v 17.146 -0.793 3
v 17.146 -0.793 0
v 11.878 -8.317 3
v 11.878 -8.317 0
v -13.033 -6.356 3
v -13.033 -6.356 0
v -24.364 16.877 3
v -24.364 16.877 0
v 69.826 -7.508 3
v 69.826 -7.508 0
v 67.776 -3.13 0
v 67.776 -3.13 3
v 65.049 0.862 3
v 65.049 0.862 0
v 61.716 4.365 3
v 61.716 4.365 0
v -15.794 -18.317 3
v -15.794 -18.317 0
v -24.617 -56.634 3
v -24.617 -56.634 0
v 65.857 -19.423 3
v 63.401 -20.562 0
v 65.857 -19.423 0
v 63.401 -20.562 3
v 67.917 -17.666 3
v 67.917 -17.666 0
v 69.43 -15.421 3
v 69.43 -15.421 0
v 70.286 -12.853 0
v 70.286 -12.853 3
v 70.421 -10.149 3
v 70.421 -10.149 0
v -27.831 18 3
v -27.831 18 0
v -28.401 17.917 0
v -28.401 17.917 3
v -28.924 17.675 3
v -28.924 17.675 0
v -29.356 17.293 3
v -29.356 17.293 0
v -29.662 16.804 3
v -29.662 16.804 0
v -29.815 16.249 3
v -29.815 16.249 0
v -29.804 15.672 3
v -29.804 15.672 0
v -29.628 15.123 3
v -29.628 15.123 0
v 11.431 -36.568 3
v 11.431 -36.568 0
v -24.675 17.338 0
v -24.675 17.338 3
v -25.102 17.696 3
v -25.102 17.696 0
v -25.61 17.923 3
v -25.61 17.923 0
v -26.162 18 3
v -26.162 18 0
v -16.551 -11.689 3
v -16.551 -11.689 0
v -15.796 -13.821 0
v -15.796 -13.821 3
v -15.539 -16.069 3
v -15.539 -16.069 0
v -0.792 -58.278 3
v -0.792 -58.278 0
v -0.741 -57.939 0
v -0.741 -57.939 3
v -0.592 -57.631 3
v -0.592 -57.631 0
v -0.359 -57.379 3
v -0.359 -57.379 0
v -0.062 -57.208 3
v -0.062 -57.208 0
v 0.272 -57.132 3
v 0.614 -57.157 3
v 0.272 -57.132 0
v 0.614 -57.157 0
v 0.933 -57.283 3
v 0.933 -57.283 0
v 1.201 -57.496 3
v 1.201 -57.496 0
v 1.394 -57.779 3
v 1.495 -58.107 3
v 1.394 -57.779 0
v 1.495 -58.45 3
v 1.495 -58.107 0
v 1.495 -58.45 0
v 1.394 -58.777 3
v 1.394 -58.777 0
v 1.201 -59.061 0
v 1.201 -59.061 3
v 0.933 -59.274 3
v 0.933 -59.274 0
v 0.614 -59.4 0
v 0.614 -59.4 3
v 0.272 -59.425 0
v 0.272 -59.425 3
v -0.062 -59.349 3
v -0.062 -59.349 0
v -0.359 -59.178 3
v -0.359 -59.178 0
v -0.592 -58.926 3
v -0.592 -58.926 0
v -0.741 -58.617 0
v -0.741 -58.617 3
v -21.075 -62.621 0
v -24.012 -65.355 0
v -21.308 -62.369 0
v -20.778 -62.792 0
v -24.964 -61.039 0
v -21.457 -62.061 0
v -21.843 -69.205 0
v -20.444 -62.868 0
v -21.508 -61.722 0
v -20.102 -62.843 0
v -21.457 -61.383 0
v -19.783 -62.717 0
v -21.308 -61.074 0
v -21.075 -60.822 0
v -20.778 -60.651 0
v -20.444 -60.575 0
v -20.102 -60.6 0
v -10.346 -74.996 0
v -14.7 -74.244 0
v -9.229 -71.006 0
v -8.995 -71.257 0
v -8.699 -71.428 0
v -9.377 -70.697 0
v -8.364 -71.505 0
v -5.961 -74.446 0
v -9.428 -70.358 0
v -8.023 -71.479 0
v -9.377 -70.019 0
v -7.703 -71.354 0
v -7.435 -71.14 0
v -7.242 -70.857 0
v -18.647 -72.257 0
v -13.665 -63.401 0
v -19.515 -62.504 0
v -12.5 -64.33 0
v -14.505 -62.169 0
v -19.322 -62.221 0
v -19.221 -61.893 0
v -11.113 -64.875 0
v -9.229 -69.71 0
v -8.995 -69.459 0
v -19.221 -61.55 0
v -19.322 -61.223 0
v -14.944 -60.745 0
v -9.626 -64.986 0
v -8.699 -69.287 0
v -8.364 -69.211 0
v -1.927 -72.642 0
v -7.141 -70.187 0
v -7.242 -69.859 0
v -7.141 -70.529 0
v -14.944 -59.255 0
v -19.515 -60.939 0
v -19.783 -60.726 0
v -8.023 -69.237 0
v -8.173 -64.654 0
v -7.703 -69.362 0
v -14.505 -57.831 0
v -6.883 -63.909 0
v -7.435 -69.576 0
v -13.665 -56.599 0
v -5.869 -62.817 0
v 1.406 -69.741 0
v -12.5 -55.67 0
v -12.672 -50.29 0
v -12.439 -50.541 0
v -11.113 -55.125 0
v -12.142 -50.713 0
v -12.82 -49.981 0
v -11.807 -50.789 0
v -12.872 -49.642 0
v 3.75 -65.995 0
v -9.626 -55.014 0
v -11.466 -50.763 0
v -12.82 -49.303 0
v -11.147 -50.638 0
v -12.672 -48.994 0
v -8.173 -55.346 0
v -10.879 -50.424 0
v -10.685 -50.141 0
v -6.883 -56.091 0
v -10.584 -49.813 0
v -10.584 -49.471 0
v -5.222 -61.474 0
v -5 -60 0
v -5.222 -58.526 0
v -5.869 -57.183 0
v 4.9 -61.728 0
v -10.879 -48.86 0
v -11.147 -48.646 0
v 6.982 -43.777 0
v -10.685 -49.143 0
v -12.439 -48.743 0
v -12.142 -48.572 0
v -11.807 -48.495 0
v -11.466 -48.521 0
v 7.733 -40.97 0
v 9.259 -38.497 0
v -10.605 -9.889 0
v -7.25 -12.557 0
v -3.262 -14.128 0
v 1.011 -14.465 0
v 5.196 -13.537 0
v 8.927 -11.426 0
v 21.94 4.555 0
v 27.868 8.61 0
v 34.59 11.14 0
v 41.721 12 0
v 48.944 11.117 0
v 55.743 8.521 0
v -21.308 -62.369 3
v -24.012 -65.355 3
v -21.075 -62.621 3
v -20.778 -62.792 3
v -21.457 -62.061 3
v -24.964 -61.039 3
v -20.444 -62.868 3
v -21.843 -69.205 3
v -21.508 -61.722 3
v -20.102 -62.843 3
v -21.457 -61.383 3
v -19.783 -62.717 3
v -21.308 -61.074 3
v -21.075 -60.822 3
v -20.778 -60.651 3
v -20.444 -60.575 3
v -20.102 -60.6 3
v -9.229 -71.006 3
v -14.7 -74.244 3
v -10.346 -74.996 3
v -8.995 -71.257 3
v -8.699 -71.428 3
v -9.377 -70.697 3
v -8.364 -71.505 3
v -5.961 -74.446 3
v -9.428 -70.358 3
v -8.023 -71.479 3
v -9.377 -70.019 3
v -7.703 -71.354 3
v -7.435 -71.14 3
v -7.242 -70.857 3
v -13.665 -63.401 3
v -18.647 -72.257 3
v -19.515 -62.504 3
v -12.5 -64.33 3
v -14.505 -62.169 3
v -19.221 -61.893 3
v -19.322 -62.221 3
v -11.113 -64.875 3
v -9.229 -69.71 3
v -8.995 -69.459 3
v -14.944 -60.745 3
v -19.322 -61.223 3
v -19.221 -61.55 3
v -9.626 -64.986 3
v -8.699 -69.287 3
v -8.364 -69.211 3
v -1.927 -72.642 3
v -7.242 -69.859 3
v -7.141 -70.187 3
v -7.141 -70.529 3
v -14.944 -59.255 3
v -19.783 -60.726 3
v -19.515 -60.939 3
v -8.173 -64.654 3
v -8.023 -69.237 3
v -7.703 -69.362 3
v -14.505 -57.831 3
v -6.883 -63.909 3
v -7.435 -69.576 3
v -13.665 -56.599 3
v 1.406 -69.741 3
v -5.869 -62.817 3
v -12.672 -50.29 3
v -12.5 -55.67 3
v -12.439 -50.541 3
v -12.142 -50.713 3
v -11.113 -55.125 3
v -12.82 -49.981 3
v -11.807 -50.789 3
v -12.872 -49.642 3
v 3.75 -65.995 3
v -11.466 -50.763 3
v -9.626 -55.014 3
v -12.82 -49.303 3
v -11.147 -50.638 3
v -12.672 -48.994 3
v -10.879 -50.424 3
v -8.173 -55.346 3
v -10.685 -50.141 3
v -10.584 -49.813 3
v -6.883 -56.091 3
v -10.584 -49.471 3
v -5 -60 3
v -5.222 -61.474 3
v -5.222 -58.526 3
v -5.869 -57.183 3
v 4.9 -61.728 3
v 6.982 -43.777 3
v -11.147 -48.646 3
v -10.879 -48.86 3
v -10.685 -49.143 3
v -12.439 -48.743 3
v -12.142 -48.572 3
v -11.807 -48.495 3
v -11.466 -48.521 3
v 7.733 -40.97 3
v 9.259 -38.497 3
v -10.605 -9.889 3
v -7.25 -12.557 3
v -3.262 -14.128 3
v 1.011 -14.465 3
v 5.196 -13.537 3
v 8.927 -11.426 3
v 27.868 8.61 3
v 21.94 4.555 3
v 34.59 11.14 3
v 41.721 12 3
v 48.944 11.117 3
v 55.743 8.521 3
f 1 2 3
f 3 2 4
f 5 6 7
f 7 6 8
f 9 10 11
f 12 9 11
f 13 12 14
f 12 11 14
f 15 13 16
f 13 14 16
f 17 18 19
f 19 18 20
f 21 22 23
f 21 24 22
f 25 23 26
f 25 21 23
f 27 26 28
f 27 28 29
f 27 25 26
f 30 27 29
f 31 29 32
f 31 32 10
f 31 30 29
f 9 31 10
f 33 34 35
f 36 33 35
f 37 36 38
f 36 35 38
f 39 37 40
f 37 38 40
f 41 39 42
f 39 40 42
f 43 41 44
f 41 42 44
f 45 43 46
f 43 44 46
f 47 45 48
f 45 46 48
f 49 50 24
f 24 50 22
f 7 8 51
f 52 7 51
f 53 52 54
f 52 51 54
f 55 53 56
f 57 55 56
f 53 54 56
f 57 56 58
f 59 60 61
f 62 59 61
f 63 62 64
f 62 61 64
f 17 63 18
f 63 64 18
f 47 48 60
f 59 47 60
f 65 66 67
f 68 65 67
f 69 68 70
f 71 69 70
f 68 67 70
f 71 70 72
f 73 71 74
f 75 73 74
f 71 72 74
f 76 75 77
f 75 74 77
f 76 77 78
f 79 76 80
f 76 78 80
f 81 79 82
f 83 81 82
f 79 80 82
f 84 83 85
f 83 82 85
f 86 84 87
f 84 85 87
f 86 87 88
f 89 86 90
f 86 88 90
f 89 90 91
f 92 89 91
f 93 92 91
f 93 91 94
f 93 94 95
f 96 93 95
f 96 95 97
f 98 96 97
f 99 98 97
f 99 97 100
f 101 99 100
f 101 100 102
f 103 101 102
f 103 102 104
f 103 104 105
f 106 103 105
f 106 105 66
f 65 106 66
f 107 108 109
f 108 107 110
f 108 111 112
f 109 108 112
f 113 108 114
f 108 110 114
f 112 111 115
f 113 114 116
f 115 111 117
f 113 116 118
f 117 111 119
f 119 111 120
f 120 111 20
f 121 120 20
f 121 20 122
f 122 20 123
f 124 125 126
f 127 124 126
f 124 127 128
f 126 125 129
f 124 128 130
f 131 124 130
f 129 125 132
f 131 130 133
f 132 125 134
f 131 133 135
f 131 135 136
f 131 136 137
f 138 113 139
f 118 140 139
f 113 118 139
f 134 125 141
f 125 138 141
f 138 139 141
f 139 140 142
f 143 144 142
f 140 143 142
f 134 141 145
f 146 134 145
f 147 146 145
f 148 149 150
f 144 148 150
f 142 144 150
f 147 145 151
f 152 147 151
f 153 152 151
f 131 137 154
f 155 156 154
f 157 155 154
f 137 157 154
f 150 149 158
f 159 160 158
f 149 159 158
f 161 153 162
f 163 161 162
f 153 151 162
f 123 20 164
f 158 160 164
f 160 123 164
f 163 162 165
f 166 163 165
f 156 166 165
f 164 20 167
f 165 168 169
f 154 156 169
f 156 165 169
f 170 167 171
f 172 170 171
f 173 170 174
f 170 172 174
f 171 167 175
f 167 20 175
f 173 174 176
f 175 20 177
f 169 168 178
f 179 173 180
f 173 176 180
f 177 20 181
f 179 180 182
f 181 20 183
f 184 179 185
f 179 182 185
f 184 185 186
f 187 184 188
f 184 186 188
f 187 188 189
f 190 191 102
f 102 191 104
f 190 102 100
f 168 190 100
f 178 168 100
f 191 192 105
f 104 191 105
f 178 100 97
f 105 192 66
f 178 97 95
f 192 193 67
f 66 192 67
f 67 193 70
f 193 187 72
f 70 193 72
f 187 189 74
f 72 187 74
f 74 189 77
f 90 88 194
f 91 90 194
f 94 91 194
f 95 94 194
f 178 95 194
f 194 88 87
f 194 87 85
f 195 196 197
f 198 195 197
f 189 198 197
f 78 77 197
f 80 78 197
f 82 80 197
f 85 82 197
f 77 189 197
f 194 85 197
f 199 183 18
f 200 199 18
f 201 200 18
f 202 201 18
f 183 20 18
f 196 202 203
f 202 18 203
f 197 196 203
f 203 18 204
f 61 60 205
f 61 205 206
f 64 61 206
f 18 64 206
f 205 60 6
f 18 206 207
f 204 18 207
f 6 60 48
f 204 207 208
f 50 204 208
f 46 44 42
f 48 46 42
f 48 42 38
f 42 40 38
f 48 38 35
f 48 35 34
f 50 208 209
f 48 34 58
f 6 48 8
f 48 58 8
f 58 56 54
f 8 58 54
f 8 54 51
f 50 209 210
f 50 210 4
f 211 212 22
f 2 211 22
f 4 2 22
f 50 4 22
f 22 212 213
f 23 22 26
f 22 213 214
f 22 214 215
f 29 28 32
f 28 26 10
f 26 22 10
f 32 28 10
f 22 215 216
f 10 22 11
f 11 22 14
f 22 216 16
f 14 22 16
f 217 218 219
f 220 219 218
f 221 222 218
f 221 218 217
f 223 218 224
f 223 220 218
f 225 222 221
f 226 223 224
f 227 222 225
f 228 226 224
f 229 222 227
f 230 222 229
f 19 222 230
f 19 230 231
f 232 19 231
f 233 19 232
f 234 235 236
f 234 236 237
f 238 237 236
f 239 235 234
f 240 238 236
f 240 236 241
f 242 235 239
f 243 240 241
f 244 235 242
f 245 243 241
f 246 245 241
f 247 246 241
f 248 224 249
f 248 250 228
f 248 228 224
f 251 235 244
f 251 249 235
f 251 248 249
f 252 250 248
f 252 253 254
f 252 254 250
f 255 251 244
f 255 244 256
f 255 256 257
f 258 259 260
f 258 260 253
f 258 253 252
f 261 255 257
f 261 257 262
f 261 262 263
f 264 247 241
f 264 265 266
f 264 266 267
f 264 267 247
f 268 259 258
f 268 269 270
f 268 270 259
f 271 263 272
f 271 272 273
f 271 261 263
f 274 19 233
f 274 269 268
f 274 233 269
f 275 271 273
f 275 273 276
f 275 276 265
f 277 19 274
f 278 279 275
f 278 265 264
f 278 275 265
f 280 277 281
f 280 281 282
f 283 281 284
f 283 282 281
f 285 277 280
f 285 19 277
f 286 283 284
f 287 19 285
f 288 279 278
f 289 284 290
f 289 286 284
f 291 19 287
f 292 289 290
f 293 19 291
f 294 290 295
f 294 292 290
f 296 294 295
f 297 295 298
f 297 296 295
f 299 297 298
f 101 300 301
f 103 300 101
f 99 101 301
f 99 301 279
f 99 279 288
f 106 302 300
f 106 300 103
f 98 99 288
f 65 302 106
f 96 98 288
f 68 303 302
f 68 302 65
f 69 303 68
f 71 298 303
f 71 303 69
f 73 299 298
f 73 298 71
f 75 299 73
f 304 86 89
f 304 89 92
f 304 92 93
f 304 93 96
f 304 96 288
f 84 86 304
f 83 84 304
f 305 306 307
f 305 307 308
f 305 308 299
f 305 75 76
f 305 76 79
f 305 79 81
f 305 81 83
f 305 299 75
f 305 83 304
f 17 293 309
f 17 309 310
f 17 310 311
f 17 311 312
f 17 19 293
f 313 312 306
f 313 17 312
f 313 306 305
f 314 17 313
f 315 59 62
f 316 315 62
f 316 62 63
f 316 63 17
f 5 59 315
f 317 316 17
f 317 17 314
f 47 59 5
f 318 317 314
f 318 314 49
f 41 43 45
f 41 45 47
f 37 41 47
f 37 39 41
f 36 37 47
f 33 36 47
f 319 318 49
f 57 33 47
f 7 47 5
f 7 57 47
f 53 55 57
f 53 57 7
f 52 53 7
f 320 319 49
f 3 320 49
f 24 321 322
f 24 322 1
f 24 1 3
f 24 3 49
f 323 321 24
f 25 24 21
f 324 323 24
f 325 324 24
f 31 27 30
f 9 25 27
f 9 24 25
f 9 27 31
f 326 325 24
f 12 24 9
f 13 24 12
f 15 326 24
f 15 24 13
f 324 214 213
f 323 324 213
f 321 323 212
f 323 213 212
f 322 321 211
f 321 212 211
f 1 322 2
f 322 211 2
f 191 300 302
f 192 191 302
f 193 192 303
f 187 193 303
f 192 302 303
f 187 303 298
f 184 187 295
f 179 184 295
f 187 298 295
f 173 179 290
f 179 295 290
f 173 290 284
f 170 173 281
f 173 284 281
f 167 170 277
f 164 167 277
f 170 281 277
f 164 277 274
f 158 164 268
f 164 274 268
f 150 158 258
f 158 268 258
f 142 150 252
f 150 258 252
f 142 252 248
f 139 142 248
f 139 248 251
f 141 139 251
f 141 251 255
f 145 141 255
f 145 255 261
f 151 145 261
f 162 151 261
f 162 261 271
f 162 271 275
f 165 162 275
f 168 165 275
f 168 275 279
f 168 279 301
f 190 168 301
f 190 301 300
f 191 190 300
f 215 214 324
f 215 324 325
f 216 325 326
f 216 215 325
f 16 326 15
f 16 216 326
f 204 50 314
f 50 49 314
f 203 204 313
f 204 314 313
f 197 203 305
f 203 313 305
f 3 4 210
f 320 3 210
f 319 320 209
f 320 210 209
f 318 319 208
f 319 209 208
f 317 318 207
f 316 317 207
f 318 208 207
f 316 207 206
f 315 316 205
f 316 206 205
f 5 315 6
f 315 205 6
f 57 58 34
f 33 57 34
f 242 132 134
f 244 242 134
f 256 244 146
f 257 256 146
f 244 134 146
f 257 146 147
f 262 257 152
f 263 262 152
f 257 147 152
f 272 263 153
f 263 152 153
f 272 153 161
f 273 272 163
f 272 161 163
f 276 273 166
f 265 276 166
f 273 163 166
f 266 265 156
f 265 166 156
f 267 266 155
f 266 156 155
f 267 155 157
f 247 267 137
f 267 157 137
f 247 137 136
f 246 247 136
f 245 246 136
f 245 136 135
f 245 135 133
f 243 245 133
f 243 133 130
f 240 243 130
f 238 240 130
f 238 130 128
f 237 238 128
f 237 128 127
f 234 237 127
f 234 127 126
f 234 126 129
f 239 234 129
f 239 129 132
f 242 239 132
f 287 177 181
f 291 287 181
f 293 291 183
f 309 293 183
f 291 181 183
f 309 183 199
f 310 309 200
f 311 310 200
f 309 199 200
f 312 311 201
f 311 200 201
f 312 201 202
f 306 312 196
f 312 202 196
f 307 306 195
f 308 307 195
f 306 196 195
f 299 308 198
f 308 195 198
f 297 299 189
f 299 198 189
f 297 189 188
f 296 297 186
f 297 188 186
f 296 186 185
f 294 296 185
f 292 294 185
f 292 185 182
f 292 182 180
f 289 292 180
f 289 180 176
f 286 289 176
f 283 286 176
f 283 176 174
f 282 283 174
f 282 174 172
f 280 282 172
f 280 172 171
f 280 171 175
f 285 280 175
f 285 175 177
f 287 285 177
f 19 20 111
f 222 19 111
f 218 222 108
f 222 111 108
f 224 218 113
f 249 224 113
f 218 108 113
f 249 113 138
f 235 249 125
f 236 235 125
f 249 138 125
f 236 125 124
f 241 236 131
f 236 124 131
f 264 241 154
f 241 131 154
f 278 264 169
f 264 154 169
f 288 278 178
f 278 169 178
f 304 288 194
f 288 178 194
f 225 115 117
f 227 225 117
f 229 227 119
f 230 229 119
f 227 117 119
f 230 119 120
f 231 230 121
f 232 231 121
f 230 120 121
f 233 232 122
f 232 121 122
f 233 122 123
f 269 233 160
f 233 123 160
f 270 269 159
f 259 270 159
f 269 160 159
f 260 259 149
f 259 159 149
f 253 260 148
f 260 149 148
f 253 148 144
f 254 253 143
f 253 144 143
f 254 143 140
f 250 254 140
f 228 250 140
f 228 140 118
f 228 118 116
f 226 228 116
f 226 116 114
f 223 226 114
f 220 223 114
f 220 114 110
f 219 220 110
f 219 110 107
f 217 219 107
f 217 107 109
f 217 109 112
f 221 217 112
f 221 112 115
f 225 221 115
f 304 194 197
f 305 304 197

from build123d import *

# Parameters (mm, degrees)
BOSS_EXTRUDE1_START            = -3
BOSS_EXTRUDE1_OUTLINE_R        = 2.5
BOSS_EXTRUDE1_DEPTH            = 3
FILLET1_R                      = 10
BOSS_EXTRUDE2_START            = -3
BOSS_EXTRUDE2_DEPTH            = 3
CUT_EXTRUDE1_START             = -3
CUT_EXTRUDE1_DEPTH             = 3
FILLET2_R                      = 10
F_2_3_2_3_DIAMETER_HOLE1_D     = 2.3
F_2_3_2_3_DIAMETER_HOLE1_DEPTH = 10
F_2_3_2_3_DIAMETER_HOLE1_TIP   = 0.690989712
SKETCH6_R                      = 5
CUT_EXTRUDE2_DEPTH             = 103.947966144


with BuildPart() as part:
    # Boss-Extrude1: read off the stored shape, not the designer's step
    # Boss-Extrude1 outline → Boss-Extrude1 (new body)
    with BuildSketch(Plane.XY.offset(3).offset(BOSS_EXTRUDE1_START)):
        with BuildLine():
            ThreePointArc((-24.364065342, 16.876742294), (-25.101814907, 17.696096192), (-26.161653435, 18))
            Line((-26.161653435, 18), (-27.830556346, 18))
            ThreePointArc((-27.830556346, 18), (-29.526652538, 17.059838528), (-29.628144438, 15.123257706))
            Line((-29.628144438, 15.123257706), (-16.550964109, -11.68893536))
            ThreePointArc((-16.550964109, -11.68893536), (-15.603505287, -14.937815984), (-15.793938159, -18.316667689))
            Line((-15.793938159, -18.316667689), (-24.617449619, -56.633968709))
            ThreePointArc((-24.617449619, -56.633968709), (-12.550978841, -74.781492041), (4.900124379, -61.728089553))
            Line((4.900124379, -61.728089553), (7.520756747, -39.132184047))
            Line((7.520756747, -39.132184047), (57.484416951, -6.361887987))
            ThreePointArc((57.484416951, -6.361887987), (61.581724267, 4.861915454), (52, 12))
            Line((52, 12), (41.720733512, 12))
            ThreePointArc((41.720733512, 12), (27.868275115, 8.610324995), (17.146172183, -0.792706909))
            Line((17.146172183, -0.792706909), (11.877704642, -8.316858327))
            ThreePointArc((11.877704642, -8.316858327), (-1.137656888, -14.455301339), (-13.032513671, -6.356381628))
            Line((-13.032513671, -6.356381628), (-24.364065342, 16.876742294))
        make_face()
        with Locations((-10, -60)):
            Circle(BOSS_EXTRUDE1_OUTLINE_R, mode=Mode.SUBTRACT)
    extrude(amount=BOSS_EXTRUDE1_DEPTH)

    # Fillet1
    fillet1_edges = [part.edges().sort_by_distance(p)[0] for p in [
        (7.520756747, -39.132184047, 1.5),
    ]]
    fillet(fillet1_edges, radius=FILLET1_R)

    # Sketch2 → Boss-Extrude2 (add)
    with BuildSketch(Plane.XY.offset(3).offset(BOSS_EXTRUDE2_START)):
        with BuildLine():
            Line((11.431019345, -36.567510792), (71.720733512, -18))
            ThreePointArc((71.720733512, -18), (69.105682696, -5.749915992), (61.716429632, 4.364528537))
            ThreePointArc((61.716429632, 4.364528537), (61.302173782, -1.670090316), (57.484416951, -6.361887987))
            Line((57.484416951, -6.361887987), (11.431019345, -36.567510792))
        make_face()
    extrude(amount=BOSS_EXTRUDE2_DEPTH)

    # Sketch2<4> → Cut-Extrude1 (cut)
    with BuildSketch(Plane.XY.offset(3).offset(CUT_EXTRUDE1_START)):
        with BuildLine():
            ThreePointArc((41.720733512, 12), (52.42269931, 10.026200742), (61.716429632, 4.364528537))
            ThreePointArc((61.716429632, 4.364528537), (58.178782835, 9.862737607), (52, 12))
            Line((52, 12), (41.720733512, 12))
        make_face()
    extrude(amount=CUT_EXTRUDE1_DEPTH, mode=Mode.SUBTRACT)

    # Fillet2
    fillet2_edges = [part.edges().sort_by_distance(p)[0] for p in [
        (71.720733512, -18, 1.5),
    ]]
    fillet(fillet2_edges, radius=FILLET2_R)

    # Ø2.3 (2.3) Diameter Hole1
    with Locations(Plane.XY.offset(3)):
        with Locations((-20.357910666, -61.721536128), (-11.721536128, -49.642089334), (-8.278463872, -70.357910666), (0.357910666, -58.278463872)):
            Hole(F_2_3_2_3_DIAMETER_HOLE1_D / 2, depth=F_2_3_2_3_DIAMETER_HOLE1_DEPTH)
            with Locations((0, 0, -(F_2_3_2_3_DIAMETER_HOLE1_DEPTH + F_2_3_2_3_DIAMETER_HOLE1_TIP / 2))):  # 118° drill point
                Cone(0, F_2_3_2_3_DIAMETER_HOLE1_D / 2, F_2_3_2_3_DIAMETER_HOLE1_TIP, mode=Mode.SUBTRACT)

    # Sketch6 → Cut-Extrude2 (cut, through all)
    with BuildSketch(Plane.XY.offset(3)):
        with Locations((-10, -60)):
            Circle(SKETCH6_R)
    extrude(amount=-CUT_EXTRUDE2_DEPTH, mode=Mode.SUBTRACT)


solid = part.part
